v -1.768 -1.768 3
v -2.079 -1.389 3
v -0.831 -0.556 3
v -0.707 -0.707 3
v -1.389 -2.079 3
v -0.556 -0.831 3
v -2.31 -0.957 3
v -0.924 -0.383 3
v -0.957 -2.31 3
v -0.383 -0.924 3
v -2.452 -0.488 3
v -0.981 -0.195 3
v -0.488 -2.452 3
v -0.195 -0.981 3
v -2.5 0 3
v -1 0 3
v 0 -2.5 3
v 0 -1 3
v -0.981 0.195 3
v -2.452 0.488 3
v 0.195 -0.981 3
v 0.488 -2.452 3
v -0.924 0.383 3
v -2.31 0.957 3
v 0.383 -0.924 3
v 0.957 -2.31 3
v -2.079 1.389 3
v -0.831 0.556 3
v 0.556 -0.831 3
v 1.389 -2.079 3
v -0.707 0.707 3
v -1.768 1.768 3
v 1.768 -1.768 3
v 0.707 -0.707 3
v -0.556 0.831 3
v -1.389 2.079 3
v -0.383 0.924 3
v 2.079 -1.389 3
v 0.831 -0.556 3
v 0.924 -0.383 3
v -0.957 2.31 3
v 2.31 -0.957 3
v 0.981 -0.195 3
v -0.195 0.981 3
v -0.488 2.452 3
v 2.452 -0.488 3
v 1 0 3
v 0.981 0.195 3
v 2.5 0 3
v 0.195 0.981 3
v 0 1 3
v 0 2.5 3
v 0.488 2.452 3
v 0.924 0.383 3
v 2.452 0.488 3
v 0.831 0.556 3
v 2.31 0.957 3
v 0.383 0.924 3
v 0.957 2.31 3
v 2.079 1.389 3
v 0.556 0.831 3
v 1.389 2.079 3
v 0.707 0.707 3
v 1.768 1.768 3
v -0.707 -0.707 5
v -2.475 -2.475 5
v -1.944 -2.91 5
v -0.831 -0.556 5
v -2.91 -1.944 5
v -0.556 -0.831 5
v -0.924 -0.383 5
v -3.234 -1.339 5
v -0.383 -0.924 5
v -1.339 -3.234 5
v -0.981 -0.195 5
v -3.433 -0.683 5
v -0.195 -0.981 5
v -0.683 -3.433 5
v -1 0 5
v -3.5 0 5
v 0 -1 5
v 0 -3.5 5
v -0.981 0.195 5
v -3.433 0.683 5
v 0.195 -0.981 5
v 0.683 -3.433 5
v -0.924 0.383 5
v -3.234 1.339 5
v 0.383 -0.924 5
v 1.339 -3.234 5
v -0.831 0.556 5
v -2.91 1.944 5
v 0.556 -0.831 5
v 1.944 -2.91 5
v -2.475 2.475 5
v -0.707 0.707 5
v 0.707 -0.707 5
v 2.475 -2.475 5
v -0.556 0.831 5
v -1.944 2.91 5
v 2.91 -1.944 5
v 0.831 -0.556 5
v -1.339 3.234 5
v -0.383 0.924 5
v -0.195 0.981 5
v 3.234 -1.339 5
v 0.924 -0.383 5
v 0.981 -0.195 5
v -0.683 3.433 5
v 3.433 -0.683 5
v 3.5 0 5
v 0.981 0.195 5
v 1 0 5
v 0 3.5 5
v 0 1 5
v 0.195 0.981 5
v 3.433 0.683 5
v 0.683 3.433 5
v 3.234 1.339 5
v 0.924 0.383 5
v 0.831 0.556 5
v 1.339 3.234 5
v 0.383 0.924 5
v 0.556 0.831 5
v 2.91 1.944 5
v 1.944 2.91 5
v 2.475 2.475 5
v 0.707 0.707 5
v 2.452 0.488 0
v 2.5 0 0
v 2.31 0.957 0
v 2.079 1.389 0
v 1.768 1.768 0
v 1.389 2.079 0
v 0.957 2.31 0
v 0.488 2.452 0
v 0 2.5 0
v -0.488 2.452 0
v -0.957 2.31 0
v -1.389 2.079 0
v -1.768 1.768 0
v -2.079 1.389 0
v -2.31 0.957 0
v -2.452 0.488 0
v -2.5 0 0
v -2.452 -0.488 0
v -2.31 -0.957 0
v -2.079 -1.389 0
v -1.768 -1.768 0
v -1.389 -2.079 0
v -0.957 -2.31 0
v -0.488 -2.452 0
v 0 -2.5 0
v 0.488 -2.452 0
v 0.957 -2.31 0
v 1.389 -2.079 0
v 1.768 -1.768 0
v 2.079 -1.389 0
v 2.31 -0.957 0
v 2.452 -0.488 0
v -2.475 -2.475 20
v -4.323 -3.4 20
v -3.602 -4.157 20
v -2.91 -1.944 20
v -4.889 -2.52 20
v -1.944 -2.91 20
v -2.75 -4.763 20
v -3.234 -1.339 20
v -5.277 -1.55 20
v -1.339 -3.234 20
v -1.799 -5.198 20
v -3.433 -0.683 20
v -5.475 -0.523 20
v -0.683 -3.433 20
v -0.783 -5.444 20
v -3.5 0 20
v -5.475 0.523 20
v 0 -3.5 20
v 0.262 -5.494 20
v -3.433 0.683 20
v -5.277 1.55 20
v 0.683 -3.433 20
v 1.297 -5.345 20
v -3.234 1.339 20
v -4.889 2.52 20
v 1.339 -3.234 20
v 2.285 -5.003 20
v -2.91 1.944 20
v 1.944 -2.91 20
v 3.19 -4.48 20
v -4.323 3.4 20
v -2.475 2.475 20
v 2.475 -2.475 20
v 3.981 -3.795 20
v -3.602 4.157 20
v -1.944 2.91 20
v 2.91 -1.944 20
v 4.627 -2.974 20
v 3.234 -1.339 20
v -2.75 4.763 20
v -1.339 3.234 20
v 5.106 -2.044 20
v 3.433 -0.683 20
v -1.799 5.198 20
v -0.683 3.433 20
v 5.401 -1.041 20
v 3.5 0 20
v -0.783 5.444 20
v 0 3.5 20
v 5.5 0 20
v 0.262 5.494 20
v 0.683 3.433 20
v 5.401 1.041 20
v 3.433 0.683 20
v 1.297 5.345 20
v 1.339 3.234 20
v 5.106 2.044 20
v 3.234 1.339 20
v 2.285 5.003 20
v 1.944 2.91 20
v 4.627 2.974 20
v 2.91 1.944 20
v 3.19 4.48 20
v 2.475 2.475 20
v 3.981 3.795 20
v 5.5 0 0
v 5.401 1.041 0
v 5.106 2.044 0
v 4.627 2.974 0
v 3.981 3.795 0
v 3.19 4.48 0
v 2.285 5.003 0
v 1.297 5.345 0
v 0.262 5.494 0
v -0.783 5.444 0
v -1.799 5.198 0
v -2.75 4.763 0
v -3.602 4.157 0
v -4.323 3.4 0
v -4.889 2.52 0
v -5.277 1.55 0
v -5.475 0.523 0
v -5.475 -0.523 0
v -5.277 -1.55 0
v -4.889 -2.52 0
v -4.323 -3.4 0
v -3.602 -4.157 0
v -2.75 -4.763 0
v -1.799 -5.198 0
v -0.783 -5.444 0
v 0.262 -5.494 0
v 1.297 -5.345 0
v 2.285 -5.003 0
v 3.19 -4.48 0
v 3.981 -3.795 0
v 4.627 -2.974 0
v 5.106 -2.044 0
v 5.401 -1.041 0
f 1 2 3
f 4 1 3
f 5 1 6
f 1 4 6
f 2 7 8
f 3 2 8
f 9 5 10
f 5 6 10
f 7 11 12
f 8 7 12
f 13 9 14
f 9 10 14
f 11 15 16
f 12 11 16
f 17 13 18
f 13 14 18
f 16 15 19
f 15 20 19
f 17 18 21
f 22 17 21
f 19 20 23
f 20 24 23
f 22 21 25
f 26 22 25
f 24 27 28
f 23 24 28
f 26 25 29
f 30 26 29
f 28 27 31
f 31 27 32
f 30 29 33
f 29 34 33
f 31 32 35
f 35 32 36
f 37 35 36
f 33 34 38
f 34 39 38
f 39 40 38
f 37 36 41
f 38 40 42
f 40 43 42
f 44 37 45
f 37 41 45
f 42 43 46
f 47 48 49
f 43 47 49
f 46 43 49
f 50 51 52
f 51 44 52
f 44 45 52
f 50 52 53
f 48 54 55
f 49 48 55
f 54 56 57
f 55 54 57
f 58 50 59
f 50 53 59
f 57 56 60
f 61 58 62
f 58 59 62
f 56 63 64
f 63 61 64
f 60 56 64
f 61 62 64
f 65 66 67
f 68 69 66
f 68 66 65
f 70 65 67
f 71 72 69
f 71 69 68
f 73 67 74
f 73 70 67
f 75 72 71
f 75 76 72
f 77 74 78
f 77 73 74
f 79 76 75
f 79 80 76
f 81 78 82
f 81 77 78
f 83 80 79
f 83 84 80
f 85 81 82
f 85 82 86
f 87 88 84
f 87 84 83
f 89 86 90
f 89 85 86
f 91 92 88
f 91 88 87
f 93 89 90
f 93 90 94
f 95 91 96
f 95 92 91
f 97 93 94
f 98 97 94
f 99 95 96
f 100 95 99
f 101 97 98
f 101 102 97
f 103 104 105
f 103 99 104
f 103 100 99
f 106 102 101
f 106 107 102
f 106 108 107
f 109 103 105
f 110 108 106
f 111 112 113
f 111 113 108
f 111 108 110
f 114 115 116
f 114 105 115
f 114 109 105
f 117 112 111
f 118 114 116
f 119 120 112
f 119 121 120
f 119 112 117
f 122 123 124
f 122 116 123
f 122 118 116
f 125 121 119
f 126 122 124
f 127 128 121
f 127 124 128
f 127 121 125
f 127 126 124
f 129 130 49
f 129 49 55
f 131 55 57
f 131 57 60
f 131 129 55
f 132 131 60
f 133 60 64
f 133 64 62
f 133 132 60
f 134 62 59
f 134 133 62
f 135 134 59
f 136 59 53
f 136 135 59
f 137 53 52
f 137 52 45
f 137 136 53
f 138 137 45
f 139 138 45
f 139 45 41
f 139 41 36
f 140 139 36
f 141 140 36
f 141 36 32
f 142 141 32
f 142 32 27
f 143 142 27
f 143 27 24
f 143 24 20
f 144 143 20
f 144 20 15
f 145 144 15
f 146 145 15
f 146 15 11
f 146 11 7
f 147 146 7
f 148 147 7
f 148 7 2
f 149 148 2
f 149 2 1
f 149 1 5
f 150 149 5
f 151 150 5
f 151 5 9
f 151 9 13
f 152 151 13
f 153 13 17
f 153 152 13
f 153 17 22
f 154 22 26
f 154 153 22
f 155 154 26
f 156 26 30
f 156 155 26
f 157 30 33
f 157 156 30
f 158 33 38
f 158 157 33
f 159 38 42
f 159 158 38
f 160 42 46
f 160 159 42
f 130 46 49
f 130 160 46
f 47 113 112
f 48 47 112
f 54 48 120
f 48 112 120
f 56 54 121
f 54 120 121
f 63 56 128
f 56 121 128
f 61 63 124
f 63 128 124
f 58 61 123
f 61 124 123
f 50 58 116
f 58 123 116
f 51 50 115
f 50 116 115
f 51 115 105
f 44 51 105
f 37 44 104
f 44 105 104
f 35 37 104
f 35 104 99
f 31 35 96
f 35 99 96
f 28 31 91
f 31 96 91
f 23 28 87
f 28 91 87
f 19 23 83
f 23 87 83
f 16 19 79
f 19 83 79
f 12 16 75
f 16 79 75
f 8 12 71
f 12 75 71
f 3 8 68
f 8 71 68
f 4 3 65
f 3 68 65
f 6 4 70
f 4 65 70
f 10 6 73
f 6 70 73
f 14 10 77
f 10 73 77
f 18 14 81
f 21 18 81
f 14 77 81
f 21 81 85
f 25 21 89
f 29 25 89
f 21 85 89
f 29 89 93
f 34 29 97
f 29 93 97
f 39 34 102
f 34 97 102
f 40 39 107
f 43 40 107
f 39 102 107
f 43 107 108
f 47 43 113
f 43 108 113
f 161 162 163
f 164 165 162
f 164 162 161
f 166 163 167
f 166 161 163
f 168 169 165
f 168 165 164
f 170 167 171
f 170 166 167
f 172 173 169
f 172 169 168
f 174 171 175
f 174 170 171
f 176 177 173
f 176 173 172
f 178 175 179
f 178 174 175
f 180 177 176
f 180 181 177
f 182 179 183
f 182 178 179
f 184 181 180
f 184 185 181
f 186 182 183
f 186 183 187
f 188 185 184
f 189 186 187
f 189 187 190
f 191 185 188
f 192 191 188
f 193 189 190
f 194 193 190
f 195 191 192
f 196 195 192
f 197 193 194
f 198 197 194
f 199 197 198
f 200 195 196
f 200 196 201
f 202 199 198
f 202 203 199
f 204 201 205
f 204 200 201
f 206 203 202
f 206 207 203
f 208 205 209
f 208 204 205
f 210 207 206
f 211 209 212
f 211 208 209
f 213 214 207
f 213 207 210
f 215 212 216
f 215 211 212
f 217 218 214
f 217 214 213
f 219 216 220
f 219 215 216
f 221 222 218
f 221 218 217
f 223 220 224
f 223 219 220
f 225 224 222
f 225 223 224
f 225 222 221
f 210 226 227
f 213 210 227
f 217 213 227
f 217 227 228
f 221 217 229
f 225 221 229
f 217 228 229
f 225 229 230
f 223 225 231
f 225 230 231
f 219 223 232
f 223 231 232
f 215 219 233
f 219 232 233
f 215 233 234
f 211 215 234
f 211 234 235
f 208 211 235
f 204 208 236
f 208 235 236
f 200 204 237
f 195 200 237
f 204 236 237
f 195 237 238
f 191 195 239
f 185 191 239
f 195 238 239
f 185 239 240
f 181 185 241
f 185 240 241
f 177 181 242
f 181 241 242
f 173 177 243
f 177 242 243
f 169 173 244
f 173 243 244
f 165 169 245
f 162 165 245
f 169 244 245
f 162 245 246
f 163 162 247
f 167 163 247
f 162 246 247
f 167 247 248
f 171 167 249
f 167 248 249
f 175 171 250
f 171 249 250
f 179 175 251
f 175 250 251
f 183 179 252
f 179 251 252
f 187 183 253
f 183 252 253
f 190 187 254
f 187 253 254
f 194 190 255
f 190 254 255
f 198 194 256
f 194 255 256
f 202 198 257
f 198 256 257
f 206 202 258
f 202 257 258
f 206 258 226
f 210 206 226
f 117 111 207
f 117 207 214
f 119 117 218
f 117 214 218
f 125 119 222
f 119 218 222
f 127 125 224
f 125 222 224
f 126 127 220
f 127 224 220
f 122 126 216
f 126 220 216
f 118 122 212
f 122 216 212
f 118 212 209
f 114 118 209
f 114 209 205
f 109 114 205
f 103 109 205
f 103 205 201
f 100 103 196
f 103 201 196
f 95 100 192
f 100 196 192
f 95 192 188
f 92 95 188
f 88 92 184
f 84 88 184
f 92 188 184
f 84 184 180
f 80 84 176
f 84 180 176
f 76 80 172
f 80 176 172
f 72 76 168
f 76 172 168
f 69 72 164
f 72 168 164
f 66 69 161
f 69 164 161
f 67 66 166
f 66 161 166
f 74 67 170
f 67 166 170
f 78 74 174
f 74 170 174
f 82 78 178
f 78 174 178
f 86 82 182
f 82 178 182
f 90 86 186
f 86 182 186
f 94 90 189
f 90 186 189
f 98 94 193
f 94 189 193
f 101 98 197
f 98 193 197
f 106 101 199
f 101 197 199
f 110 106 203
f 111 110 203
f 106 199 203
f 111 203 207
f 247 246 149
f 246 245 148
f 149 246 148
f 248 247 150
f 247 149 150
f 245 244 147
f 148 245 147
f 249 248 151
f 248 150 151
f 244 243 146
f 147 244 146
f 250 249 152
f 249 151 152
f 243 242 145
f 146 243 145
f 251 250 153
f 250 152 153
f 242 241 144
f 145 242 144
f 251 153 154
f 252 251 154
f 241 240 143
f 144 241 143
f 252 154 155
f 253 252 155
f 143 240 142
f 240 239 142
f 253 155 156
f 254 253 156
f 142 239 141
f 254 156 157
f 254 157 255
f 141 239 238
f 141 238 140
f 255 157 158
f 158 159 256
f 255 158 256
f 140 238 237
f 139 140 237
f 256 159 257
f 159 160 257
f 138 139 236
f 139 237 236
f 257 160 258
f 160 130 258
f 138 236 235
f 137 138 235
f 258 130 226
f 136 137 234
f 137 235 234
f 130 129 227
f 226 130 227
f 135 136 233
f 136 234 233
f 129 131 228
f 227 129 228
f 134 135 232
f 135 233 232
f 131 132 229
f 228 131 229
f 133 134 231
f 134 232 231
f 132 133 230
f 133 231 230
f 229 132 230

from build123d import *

# Parameters (mm, degrees)
SKETCH1_R           = 5.5
SKETCH1_R_2         = 2.5
BOSS_EXTRUDE1_DEPTH = 20
BOSS_EXTRUDE2_START = -17
SKETCH2_R           = 2.5
BOSS_EXTRUDE2_DEPTH = 2
SKETCH3_R           = 1
CUT_EXTRUDE1_DEPTH  = 2
SKETCH4_R           = 3.5
CUT_EXTRUDE3_DEPTH  = 15


with BuildPart() as part:
    # Sketch1 → Boss-Extrude1 (new body)
    with BuildSketch(Plane.XY):
        Circle(SKETCH1_R)
        Circle(SKETCH1_R_2, mode=Mode.SUBTRACT)
    extrude(amount=BOSS_EXTRUDE1_DEPTH)

    # Sketch2 → Boss-Extrude2 (add)
    with BuildSketch(Plane.XY.offset(20).offset(BOSS_EXTRUDE2_START)):
        Circle(SKETCH2_R)
    extrude(amount=BOSS_EXTRUDE2_DEPTH)

    # Sketch3 → Cut-Extrude1 (cut)
    with BuildSketch(Plane.XY.offset(5)):
        Circle(SKETCH3_R)
    extrude(amount=-CUT_EXTRUDE1_DEPTH, mode=Mode.SUBTRACT)

    # Sketch4 → Cut-Extrude3 (cut)
    with BuildSketch(Plane.XY.offset(20)):
        Circle(SKETCH4_R)
    extrude(amount=-CUT_EXTRUDE3_DEPTH, mode=Mode.SUBTRACT)


solid = part.part
